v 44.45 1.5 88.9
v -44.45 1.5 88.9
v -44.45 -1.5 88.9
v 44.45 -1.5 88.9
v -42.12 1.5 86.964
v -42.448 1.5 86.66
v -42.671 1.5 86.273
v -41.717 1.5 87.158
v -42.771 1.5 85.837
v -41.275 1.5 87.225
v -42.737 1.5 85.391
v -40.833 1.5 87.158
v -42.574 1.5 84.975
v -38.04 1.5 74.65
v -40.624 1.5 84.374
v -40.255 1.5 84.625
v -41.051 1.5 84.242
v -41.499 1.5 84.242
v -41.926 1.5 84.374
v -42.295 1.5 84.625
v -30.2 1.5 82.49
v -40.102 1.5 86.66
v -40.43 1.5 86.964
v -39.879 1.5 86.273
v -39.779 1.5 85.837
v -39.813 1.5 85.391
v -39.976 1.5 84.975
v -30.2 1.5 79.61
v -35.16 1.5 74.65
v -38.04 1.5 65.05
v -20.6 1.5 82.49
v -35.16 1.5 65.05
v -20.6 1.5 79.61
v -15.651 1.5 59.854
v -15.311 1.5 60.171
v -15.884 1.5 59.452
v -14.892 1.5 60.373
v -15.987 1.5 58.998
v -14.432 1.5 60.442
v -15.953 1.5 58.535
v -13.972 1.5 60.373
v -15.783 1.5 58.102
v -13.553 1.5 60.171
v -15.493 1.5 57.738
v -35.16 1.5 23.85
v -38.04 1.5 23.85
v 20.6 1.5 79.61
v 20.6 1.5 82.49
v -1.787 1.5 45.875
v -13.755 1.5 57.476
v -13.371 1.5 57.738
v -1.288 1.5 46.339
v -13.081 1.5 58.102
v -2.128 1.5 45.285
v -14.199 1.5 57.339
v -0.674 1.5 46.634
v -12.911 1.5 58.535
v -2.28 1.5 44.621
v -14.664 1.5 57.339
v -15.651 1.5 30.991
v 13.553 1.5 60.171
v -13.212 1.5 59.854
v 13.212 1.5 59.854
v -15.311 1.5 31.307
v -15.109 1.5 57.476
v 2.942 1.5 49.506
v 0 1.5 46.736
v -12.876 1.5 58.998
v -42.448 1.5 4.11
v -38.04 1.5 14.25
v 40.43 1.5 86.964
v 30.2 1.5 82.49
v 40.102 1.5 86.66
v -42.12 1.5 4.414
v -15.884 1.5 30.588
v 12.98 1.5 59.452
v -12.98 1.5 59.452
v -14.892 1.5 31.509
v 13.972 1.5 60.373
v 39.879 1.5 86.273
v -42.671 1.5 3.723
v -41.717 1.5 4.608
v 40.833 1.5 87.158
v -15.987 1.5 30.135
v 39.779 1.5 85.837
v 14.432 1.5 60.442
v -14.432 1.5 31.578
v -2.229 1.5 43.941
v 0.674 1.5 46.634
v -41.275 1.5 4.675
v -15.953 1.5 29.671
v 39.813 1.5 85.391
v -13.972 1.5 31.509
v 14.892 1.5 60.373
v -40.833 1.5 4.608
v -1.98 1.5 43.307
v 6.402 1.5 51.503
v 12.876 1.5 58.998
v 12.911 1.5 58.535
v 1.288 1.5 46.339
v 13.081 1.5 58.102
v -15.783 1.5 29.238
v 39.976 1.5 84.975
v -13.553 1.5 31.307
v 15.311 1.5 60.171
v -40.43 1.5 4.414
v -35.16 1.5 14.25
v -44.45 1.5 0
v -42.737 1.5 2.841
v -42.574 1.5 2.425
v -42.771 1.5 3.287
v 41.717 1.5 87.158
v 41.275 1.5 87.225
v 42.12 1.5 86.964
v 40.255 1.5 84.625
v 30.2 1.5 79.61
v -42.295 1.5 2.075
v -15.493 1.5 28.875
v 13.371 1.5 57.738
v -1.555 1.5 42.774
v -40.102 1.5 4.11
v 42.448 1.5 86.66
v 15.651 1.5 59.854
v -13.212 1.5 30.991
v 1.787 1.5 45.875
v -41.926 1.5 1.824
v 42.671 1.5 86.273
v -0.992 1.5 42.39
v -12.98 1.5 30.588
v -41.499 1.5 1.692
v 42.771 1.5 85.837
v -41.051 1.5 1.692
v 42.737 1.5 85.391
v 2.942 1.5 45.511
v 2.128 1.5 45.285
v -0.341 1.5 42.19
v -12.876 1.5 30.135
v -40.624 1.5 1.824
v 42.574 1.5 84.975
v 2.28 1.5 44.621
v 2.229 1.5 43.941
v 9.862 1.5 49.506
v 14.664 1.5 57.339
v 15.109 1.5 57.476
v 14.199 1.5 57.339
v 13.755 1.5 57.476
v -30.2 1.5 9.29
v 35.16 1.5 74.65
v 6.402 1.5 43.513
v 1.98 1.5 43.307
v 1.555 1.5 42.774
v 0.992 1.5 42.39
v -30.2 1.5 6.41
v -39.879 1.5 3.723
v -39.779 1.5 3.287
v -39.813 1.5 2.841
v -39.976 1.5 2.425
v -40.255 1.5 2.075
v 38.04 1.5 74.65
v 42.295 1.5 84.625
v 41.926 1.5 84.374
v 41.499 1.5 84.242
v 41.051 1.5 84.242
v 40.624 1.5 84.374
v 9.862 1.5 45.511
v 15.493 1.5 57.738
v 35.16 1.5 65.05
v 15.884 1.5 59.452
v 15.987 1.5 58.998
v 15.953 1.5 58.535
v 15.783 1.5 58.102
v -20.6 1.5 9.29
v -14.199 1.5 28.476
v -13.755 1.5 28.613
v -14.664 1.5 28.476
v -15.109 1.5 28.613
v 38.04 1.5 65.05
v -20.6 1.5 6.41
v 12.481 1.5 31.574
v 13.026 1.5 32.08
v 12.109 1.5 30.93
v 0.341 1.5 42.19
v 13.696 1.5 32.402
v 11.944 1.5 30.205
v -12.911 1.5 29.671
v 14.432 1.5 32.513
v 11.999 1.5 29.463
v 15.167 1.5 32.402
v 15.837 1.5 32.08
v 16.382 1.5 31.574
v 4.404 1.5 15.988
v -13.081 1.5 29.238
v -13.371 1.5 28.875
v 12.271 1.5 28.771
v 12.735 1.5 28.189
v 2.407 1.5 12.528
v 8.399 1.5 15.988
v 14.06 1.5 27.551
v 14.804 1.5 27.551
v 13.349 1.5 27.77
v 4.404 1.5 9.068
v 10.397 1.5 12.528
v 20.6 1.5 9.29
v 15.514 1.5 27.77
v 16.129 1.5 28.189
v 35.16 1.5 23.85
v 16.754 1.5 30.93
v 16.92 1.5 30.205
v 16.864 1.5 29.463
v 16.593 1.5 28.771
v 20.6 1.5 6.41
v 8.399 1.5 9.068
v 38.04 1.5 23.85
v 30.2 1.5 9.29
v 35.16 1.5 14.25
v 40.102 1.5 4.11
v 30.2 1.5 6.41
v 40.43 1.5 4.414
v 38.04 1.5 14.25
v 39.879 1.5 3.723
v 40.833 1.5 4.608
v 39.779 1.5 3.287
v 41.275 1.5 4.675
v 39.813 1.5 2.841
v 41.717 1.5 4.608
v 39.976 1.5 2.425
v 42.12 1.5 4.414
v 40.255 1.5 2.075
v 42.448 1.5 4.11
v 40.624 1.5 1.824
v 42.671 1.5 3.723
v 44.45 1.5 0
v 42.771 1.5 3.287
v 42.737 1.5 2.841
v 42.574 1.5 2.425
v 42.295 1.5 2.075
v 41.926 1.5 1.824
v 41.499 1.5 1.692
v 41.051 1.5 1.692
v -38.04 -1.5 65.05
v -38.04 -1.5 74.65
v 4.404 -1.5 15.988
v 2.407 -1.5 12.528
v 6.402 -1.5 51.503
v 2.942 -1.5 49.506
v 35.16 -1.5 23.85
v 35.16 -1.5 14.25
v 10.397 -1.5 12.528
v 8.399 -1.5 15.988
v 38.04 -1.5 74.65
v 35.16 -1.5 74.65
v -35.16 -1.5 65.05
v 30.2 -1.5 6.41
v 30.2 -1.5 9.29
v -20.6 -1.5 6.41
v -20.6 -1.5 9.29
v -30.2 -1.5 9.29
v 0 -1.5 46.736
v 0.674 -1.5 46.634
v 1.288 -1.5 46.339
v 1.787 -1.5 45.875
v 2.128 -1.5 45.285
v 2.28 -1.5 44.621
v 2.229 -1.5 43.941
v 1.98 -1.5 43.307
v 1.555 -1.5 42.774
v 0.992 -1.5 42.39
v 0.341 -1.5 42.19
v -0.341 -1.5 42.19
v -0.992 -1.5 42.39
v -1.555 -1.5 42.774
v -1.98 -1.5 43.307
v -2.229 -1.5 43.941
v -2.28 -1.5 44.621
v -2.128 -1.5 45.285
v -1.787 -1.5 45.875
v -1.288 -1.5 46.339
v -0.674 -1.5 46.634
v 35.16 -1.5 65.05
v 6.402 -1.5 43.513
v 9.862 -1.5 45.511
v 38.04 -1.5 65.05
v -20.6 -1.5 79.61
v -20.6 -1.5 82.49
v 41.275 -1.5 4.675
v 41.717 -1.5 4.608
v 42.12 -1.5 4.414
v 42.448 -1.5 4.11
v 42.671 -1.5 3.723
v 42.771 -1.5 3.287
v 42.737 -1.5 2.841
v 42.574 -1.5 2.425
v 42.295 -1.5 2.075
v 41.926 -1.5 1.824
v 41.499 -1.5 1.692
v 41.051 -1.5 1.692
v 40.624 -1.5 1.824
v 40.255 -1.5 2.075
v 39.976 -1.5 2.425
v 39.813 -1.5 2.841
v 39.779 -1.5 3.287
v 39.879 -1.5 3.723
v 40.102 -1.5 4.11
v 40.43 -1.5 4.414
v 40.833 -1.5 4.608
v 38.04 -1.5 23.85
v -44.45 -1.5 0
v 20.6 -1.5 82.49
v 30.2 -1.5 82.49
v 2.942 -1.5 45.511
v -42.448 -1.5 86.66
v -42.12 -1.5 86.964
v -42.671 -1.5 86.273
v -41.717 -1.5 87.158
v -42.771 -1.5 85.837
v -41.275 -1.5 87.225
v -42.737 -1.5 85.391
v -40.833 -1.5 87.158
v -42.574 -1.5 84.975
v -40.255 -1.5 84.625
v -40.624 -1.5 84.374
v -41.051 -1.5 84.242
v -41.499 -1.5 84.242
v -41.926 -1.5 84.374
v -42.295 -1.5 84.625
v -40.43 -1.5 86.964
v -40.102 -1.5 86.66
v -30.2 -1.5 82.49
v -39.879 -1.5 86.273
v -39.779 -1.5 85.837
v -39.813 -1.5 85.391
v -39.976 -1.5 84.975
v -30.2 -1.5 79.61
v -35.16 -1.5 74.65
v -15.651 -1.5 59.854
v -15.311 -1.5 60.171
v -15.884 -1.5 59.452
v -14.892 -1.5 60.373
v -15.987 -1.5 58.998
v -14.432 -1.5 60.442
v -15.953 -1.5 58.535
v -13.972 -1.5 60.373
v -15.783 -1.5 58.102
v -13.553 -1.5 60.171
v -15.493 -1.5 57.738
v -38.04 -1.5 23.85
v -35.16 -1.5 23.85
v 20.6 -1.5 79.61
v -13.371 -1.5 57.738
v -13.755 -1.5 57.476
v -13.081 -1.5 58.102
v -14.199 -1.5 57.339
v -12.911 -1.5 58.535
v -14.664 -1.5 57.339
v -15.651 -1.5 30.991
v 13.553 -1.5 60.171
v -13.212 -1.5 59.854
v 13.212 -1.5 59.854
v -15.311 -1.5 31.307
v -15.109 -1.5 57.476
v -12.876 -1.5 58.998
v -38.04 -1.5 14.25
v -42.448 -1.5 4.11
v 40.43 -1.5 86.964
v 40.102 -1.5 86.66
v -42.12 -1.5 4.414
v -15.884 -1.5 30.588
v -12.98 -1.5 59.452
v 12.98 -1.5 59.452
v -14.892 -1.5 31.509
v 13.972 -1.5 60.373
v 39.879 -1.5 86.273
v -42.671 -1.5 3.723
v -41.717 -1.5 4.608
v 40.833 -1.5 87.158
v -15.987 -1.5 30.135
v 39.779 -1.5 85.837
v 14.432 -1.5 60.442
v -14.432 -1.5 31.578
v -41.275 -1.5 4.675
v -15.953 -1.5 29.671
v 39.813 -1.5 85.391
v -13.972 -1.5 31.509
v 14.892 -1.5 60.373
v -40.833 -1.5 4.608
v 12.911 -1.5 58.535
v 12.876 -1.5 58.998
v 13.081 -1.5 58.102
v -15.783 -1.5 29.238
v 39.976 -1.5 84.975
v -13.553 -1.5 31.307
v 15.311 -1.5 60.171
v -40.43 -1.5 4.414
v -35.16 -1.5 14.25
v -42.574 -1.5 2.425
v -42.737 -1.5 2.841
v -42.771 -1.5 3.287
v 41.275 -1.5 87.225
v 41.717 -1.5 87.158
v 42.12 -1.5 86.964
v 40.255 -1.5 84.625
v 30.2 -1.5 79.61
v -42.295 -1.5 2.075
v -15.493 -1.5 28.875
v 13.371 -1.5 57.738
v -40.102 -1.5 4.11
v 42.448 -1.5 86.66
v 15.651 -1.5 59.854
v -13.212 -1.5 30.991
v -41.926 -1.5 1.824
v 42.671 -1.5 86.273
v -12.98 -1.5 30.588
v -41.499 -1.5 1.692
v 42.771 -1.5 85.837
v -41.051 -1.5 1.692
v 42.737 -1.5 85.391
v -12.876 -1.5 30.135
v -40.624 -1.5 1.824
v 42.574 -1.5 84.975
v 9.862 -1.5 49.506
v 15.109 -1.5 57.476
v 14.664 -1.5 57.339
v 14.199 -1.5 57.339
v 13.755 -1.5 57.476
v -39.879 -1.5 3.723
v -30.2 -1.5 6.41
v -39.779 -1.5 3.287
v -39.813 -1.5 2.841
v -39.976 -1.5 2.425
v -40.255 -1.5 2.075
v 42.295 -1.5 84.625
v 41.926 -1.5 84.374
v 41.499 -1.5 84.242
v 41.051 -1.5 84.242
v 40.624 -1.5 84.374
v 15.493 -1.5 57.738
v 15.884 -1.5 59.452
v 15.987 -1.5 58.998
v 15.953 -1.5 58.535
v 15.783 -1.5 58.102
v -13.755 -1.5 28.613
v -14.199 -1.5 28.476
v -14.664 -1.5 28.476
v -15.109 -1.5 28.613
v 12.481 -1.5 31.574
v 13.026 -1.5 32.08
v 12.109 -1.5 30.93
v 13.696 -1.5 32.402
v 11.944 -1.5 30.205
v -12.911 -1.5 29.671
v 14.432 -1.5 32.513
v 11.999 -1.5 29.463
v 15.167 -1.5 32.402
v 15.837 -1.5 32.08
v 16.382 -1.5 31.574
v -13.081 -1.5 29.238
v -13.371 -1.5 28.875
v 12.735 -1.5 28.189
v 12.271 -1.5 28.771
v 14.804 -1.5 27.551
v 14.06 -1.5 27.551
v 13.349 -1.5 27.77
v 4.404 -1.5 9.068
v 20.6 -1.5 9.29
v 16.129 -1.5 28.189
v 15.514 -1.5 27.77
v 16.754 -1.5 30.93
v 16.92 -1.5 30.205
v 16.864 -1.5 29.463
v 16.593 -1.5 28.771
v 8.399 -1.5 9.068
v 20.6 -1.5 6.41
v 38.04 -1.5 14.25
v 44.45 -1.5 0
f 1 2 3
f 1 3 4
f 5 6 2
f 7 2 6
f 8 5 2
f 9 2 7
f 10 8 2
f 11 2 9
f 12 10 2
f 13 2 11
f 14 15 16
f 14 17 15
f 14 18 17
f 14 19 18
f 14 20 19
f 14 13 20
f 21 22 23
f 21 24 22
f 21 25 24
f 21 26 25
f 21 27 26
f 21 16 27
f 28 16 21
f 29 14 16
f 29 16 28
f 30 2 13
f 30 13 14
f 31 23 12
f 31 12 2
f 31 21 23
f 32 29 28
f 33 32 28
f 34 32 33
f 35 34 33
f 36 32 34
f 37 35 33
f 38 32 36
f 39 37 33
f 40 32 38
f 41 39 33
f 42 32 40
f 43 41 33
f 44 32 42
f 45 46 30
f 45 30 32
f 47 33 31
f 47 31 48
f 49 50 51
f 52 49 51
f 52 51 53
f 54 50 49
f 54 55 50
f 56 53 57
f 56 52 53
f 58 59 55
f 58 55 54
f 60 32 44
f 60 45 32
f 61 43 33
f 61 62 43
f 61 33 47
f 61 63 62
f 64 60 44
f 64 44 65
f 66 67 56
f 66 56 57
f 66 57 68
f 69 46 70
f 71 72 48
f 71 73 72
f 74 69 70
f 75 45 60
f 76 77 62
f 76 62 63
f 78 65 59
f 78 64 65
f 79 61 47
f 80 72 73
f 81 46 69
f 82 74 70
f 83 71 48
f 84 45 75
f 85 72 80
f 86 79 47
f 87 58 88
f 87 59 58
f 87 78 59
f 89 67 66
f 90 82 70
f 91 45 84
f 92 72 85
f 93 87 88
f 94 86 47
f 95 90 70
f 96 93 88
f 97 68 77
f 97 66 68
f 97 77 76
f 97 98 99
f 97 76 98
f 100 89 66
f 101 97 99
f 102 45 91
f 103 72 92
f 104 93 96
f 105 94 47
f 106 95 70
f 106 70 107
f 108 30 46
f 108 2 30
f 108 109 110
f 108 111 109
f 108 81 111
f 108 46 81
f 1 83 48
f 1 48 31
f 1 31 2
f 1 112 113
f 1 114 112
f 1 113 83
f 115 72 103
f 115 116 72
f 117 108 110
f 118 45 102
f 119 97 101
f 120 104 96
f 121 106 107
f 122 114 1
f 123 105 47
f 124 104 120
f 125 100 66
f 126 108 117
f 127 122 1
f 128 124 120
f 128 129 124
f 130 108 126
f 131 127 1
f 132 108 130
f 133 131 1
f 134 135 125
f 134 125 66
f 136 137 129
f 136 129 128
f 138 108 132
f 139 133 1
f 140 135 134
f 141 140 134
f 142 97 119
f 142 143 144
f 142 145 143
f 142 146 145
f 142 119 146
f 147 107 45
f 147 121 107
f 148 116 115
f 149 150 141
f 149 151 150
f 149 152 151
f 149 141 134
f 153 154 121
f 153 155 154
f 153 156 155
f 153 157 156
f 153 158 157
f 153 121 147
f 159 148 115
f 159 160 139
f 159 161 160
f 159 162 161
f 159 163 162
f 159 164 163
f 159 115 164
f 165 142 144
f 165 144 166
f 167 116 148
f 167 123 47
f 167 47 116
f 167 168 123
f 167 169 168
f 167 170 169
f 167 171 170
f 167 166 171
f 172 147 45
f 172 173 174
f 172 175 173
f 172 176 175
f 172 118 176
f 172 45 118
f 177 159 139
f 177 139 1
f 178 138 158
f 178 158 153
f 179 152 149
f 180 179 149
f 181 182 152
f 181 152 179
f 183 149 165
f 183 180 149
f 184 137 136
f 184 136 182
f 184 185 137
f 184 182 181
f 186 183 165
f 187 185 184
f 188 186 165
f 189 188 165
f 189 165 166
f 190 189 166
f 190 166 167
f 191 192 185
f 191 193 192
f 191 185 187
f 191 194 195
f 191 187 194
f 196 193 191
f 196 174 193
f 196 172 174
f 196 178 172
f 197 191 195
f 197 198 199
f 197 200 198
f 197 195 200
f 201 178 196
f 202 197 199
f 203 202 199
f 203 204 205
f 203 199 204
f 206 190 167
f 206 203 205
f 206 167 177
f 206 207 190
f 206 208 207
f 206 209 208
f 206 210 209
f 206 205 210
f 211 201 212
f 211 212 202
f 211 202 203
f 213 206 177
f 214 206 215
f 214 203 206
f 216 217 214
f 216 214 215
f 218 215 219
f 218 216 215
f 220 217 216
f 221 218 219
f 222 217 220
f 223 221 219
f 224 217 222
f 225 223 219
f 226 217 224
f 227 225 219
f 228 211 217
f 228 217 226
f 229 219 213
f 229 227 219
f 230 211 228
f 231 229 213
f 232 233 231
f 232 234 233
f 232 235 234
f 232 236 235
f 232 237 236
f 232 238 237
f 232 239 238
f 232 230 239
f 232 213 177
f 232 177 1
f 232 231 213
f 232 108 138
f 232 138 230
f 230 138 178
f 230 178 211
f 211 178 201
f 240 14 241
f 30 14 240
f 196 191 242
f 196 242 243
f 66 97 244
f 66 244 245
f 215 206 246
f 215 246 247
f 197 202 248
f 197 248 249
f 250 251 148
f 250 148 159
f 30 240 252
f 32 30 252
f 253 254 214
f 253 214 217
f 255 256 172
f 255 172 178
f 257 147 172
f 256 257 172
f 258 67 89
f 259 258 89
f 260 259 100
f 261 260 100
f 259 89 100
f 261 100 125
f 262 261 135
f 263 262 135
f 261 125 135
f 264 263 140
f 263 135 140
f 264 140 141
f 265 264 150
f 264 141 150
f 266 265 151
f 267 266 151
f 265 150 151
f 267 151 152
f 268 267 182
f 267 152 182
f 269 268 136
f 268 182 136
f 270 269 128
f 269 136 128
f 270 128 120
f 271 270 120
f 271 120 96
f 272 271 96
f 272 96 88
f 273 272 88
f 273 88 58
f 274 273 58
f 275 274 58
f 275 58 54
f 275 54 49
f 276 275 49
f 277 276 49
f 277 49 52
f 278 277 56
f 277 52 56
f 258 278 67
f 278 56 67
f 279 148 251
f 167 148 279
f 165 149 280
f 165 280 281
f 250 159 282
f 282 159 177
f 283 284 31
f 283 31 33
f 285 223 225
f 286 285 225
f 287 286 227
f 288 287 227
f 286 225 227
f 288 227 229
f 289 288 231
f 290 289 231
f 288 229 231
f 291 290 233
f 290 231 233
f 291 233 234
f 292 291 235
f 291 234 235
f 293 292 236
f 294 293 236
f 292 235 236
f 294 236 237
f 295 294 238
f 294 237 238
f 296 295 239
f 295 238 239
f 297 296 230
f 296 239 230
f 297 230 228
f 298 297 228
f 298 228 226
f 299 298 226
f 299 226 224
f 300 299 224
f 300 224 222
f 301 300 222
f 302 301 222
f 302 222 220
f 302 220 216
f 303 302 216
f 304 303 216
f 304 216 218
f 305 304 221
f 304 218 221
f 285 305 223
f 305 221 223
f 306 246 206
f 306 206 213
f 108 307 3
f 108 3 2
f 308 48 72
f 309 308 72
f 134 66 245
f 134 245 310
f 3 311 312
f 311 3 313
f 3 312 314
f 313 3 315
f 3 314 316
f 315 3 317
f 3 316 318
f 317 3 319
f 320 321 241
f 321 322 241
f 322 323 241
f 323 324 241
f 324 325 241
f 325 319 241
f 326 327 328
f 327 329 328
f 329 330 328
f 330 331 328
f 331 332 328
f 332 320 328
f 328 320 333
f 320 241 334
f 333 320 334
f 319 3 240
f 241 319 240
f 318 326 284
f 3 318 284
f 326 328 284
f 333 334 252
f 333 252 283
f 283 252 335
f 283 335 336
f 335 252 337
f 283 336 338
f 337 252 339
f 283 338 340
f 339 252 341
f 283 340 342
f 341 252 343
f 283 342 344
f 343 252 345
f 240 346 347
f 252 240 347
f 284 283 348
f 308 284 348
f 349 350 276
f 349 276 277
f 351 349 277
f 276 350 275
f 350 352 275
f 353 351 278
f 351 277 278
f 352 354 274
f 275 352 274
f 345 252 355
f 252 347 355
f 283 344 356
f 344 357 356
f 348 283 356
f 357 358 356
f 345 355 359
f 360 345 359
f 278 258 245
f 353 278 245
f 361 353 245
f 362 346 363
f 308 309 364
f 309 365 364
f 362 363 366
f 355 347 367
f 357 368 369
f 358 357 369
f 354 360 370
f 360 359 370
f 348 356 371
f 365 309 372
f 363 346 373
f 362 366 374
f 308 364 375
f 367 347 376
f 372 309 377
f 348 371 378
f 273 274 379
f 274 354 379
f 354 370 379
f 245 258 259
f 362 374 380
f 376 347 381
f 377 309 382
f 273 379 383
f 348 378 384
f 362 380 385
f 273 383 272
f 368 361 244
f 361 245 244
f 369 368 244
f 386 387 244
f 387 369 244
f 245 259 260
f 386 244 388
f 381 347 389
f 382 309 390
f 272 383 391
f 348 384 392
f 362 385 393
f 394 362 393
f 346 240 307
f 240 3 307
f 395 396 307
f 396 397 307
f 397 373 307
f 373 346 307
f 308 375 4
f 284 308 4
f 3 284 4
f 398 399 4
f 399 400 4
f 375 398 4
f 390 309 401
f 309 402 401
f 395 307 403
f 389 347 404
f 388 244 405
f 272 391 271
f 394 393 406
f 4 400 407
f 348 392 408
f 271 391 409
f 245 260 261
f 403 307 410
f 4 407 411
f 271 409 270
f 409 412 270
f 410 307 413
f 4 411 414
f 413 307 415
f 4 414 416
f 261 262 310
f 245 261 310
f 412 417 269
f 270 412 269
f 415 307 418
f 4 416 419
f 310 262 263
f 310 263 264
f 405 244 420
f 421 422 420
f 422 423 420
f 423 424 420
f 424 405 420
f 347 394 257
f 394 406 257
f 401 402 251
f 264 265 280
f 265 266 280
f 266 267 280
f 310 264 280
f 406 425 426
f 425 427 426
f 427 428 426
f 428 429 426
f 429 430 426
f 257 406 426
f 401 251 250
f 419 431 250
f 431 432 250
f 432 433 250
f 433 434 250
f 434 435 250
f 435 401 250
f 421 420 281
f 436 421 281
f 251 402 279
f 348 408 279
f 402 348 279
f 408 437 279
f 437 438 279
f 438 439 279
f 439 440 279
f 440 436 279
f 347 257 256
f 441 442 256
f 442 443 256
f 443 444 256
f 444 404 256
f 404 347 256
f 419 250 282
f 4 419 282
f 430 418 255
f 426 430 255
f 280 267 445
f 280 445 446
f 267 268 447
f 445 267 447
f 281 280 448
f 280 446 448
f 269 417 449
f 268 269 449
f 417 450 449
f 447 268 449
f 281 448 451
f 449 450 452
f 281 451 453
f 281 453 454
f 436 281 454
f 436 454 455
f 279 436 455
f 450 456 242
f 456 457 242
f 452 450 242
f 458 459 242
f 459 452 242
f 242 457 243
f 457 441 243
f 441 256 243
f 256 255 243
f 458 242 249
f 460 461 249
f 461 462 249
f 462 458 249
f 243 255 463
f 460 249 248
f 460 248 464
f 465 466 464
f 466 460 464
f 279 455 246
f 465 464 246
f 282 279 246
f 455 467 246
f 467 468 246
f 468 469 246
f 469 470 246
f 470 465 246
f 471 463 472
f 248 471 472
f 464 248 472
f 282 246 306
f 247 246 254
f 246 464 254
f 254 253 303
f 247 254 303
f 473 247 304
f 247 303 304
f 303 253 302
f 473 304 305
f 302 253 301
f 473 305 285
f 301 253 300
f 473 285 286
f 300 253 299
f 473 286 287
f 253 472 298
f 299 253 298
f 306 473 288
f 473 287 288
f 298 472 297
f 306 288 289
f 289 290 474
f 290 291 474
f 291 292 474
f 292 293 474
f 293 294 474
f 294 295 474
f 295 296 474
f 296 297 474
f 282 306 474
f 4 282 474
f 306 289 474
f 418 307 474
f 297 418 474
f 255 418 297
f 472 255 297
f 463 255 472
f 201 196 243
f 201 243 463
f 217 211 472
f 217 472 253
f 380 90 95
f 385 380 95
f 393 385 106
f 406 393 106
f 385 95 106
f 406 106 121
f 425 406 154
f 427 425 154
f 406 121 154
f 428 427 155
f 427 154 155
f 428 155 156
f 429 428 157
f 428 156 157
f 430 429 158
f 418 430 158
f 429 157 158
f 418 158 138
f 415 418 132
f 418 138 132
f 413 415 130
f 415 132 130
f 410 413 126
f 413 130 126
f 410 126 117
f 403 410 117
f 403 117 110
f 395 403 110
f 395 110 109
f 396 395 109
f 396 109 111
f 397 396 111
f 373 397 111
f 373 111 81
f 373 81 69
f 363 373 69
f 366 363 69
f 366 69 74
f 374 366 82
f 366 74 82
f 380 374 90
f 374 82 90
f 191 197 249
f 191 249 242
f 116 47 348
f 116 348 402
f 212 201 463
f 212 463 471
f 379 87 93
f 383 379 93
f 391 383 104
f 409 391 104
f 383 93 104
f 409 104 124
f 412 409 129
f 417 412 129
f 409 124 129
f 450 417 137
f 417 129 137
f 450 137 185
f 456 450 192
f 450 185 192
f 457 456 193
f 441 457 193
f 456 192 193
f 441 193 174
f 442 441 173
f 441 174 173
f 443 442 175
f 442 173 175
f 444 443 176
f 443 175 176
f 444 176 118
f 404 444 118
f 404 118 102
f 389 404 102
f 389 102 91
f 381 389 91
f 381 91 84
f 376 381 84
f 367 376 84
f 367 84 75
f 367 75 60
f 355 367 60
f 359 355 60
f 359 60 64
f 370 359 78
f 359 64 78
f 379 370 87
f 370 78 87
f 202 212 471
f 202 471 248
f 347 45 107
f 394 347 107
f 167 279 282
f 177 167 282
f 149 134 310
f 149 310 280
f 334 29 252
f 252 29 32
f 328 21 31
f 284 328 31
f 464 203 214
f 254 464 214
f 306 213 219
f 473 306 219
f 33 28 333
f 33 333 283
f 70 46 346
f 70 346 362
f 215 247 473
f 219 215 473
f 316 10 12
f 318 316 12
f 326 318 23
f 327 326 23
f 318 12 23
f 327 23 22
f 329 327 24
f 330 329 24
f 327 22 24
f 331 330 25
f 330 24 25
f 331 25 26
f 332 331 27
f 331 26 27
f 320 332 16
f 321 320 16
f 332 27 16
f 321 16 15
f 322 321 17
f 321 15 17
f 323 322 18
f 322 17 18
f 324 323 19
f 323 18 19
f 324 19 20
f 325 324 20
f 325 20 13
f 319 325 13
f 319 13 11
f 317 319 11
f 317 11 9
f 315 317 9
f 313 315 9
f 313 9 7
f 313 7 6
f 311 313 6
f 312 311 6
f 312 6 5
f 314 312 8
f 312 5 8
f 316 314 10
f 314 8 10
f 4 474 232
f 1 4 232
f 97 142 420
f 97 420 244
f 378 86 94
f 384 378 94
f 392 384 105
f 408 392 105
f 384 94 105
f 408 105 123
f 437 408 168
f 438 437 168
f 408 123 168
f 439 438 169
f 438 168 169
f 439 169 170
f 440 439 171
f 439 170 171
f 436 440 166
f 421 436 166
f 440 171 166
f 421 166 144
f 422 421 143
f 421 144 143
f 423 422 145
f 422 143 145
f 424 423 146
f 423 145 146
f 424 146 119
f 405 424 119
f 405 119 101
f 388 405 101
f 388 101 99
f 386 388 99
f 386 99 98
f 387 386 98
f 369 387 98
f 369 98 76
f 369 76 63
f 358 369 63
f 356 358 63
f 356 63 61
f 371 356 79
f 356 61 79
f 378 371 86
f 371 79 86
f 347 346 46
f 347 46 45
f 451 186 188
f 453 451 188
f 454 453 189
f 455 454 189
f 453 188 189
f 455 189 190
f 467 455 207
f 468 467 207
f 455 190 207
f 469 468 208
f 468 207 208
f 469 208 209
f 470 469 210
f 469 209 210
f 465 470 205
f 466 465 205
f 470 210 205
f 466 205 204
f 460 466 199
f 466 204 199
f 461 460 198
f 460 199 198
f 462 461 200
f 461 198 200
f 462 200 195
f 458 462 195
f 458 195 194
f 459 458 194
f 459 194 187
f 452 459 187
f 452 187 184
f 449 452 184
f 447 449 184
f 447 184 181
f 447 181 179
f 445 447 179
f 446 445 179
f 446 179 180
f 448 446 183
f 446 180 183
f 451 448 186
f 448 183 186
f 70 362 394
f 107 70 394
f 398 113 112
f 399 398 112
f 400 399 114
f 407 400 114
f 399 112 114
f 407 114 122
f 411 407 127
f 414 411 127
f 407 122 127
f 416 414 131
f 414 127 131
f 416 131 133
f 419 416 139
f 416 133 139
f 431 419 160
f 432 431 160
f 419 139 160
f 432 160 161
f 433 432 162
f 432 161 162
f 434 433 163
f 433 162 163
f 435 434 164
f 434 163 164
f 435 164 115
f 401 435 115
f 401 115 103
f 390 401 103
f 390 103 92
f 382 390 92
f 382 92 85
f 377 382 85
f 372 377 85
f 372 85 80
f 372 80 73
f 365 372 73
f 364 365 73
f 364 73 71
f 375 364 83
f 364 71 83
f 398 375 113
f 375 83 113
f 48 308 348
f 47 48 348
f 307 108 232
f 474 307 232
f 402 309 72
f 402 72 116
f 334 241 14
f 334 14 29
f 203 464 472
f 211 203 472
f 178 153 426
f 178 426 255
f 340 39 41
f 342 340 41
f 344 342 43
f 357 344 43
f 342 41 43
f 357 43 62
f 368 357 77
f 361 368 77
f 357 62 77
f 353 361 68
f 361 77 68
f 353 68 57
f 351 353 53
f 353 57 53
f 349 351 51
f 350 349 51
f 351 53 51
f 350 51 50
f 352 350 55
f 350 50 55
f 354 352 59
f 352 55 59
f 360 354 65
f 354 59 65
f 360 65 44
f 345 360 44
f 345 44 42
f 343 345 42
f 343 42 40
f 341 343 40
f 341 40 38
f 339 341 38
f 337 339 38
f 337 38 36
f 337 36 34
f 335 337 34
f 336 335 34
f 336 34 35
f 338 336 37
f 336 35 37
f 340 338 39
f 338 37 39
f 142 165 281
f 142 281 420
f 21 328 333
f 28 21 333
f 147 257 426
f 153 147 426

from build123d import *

# Parameters (mm, degrees)
SKETCH_2_W          = 88.9
SKETCH_2_H          = 3
EXTRUDE_1_DEPTH     = 88.9
SKETCH_4_R          = 1.5
SKETCH_4_W          = 2.88
SKETCH_4_H          = 9.6
SKETCH_4_W_2        = 9.6
SKETCH_4_H_2        = 2.88
CUT_EXTRUDE_1_DEPTH = 3
SKETCH_5_R          = 1.56
CUT_EXTRUDE_2_DEPTH = 3
SKETCH_7_R          = 2.495
CUT_EXTRUDE_3_DEPTH = 3
SKETCH_8_R          = 2.286
CUT_EXTRUDE_4_DEPTH = 3


with BuildPart() as part:
    # 스케치2 → 보스-돌출1 (new body)
    with BuildSketch(Plane.XY):
        Rectangle(SKETCH_2_W, SKETCH_2_H)
    extrude(amount=EXTRUDE_1_DEPTH)

    # 스케치4 → 컷-돌출1 (cut)
    with BuildSketch(Plane(origin=(0, 1.5, 0), x_dir=(1, 0, 0), z_dir=(0, 1, 0))):
        with Locations(Location((-41.275, -85.725, 0), (0, 0, 270))):
            Circle(SKETCH_4_R)
        with Locations(Location((-41.275, -3.175, 0), (0, 0, 270))):
            Circle(SKETCH_4_R)
        with Locations(Location((41.275, -3.175, 0), (0, 0, 270))):
            Circle(SKETCH_4_R)
        with Locations(Location((41.275, -85.725, 0), (0, 0, 270))):
            Circle(SKETCH_4_R)
        with Locations((-36.6, -69.85)):
            Rectangle(SKETCH_4_W, SKETCH_4_H)
        with Locations((-36.6, -19.05)):
            Rectangle(SKETCH_4_W, SKETCH_4_H)
        with Locations((-25.4, -7.85)):
            Rectangle(SKETCH_4_W_2, SKETCH_4_H_2)
        with Locations((36.6, -69.85)):
            Rectangle(SKETCH_4_W, SKETCH_4_H)
        with Locations((36.6, -19.05)):
            Rectangle(SKETCH_4_W, SKETCH_4_H)
        with Locations((25.4, -7.85)):
            Rectangle(SKETCH_4_W_2, SKETCH_4_H_2)
        with Locations((25.4, -81.05)):
            Rectangle(SKETCH_4_W_2, SKETCH_4_H_2)
        with Locations((-25.4, -81.05)):
            Rectangle(SKETCH_4_W_2, SKETCH_4_H_2)
    extrude(amount=-CUT_EXTRUDE_1_DEPTH, mode=Mode.SUBTRACT)

    # 스케치5 → 컷-돌출2 (cut)
    with BuildSketch(Plane(origin=(0, 1.5, 0), x_dir=(1, 0, 0), z_dir=(0, 1, 0))):
        with Locations(Location((-14.431818182, -30.018181818, 0), (0, 0, 270))):
            Circle(SKETCH_5_R)
        with Locations(Location((14.431818182, -30.018181818, 0), (0, 0, 270))):
            Circle(SKETCH_5_R)
        with Locations(Location((14.431818182, -58.881818182, 0), (0, 0, 270))):
            Circle(SKETCH_5_R)
        with Locations(Location((-14.431818182, -58.881818182, 0), (0, 0, 270))):
            Circle(SKETCH_5_R)
    extrude(amount=-CUT_EXTRUDE_2_DEPTH, mode=Mode.SUBTRACT)

    # 스케치7 → 컷-돌출3 (cut)
    with BuildSketch(Plane(origin=(0, 1.5, 0), x_dir=(1, 0, 0), z_dir=(0, 1, 0))):
        with Locations(Location((14.431818182, -30.018181818, 0), (0, 0, 270))):
            Circle(SKETCH_7_R)
        Polygon((6.401818182, -51.503445681), (2.941818182, -49.50581375), (2.941818182, -45.510549887), (6.401818182, -43.512917955), (9.861818182, -45.510549887), (9.861818182, -49.50581375), align=None)
        Polygon((4.40418625, -15.988181818), (2.406554319, -12.528181818), (4.40418625, -9.068181818), (8.399450113, -9.068181818), (10.397082045, -12.528181818), (8.399450113, -15.988181818), align=None)
    extrude(amount=-CUT_EXTRUDE_3_DEPTH, mode=Mode.SUBTRACT)

    # 스케치8 → 컷-돌출4 (cut)
    with BuildSketch(Plane(origin=(0, 1.5, 0), x_dir=(1, 0, 0), z_dir=(0, 1, 0))):
        with Locations(Location((0, -44.45, 0), (0, 0, 270))):
            Circle(SKETCH_8_R)
    extrude(amount=-CUT_EXTRUDE_4_DEPTH, mode=Mode.SUBTRACT)


solid = part.part
